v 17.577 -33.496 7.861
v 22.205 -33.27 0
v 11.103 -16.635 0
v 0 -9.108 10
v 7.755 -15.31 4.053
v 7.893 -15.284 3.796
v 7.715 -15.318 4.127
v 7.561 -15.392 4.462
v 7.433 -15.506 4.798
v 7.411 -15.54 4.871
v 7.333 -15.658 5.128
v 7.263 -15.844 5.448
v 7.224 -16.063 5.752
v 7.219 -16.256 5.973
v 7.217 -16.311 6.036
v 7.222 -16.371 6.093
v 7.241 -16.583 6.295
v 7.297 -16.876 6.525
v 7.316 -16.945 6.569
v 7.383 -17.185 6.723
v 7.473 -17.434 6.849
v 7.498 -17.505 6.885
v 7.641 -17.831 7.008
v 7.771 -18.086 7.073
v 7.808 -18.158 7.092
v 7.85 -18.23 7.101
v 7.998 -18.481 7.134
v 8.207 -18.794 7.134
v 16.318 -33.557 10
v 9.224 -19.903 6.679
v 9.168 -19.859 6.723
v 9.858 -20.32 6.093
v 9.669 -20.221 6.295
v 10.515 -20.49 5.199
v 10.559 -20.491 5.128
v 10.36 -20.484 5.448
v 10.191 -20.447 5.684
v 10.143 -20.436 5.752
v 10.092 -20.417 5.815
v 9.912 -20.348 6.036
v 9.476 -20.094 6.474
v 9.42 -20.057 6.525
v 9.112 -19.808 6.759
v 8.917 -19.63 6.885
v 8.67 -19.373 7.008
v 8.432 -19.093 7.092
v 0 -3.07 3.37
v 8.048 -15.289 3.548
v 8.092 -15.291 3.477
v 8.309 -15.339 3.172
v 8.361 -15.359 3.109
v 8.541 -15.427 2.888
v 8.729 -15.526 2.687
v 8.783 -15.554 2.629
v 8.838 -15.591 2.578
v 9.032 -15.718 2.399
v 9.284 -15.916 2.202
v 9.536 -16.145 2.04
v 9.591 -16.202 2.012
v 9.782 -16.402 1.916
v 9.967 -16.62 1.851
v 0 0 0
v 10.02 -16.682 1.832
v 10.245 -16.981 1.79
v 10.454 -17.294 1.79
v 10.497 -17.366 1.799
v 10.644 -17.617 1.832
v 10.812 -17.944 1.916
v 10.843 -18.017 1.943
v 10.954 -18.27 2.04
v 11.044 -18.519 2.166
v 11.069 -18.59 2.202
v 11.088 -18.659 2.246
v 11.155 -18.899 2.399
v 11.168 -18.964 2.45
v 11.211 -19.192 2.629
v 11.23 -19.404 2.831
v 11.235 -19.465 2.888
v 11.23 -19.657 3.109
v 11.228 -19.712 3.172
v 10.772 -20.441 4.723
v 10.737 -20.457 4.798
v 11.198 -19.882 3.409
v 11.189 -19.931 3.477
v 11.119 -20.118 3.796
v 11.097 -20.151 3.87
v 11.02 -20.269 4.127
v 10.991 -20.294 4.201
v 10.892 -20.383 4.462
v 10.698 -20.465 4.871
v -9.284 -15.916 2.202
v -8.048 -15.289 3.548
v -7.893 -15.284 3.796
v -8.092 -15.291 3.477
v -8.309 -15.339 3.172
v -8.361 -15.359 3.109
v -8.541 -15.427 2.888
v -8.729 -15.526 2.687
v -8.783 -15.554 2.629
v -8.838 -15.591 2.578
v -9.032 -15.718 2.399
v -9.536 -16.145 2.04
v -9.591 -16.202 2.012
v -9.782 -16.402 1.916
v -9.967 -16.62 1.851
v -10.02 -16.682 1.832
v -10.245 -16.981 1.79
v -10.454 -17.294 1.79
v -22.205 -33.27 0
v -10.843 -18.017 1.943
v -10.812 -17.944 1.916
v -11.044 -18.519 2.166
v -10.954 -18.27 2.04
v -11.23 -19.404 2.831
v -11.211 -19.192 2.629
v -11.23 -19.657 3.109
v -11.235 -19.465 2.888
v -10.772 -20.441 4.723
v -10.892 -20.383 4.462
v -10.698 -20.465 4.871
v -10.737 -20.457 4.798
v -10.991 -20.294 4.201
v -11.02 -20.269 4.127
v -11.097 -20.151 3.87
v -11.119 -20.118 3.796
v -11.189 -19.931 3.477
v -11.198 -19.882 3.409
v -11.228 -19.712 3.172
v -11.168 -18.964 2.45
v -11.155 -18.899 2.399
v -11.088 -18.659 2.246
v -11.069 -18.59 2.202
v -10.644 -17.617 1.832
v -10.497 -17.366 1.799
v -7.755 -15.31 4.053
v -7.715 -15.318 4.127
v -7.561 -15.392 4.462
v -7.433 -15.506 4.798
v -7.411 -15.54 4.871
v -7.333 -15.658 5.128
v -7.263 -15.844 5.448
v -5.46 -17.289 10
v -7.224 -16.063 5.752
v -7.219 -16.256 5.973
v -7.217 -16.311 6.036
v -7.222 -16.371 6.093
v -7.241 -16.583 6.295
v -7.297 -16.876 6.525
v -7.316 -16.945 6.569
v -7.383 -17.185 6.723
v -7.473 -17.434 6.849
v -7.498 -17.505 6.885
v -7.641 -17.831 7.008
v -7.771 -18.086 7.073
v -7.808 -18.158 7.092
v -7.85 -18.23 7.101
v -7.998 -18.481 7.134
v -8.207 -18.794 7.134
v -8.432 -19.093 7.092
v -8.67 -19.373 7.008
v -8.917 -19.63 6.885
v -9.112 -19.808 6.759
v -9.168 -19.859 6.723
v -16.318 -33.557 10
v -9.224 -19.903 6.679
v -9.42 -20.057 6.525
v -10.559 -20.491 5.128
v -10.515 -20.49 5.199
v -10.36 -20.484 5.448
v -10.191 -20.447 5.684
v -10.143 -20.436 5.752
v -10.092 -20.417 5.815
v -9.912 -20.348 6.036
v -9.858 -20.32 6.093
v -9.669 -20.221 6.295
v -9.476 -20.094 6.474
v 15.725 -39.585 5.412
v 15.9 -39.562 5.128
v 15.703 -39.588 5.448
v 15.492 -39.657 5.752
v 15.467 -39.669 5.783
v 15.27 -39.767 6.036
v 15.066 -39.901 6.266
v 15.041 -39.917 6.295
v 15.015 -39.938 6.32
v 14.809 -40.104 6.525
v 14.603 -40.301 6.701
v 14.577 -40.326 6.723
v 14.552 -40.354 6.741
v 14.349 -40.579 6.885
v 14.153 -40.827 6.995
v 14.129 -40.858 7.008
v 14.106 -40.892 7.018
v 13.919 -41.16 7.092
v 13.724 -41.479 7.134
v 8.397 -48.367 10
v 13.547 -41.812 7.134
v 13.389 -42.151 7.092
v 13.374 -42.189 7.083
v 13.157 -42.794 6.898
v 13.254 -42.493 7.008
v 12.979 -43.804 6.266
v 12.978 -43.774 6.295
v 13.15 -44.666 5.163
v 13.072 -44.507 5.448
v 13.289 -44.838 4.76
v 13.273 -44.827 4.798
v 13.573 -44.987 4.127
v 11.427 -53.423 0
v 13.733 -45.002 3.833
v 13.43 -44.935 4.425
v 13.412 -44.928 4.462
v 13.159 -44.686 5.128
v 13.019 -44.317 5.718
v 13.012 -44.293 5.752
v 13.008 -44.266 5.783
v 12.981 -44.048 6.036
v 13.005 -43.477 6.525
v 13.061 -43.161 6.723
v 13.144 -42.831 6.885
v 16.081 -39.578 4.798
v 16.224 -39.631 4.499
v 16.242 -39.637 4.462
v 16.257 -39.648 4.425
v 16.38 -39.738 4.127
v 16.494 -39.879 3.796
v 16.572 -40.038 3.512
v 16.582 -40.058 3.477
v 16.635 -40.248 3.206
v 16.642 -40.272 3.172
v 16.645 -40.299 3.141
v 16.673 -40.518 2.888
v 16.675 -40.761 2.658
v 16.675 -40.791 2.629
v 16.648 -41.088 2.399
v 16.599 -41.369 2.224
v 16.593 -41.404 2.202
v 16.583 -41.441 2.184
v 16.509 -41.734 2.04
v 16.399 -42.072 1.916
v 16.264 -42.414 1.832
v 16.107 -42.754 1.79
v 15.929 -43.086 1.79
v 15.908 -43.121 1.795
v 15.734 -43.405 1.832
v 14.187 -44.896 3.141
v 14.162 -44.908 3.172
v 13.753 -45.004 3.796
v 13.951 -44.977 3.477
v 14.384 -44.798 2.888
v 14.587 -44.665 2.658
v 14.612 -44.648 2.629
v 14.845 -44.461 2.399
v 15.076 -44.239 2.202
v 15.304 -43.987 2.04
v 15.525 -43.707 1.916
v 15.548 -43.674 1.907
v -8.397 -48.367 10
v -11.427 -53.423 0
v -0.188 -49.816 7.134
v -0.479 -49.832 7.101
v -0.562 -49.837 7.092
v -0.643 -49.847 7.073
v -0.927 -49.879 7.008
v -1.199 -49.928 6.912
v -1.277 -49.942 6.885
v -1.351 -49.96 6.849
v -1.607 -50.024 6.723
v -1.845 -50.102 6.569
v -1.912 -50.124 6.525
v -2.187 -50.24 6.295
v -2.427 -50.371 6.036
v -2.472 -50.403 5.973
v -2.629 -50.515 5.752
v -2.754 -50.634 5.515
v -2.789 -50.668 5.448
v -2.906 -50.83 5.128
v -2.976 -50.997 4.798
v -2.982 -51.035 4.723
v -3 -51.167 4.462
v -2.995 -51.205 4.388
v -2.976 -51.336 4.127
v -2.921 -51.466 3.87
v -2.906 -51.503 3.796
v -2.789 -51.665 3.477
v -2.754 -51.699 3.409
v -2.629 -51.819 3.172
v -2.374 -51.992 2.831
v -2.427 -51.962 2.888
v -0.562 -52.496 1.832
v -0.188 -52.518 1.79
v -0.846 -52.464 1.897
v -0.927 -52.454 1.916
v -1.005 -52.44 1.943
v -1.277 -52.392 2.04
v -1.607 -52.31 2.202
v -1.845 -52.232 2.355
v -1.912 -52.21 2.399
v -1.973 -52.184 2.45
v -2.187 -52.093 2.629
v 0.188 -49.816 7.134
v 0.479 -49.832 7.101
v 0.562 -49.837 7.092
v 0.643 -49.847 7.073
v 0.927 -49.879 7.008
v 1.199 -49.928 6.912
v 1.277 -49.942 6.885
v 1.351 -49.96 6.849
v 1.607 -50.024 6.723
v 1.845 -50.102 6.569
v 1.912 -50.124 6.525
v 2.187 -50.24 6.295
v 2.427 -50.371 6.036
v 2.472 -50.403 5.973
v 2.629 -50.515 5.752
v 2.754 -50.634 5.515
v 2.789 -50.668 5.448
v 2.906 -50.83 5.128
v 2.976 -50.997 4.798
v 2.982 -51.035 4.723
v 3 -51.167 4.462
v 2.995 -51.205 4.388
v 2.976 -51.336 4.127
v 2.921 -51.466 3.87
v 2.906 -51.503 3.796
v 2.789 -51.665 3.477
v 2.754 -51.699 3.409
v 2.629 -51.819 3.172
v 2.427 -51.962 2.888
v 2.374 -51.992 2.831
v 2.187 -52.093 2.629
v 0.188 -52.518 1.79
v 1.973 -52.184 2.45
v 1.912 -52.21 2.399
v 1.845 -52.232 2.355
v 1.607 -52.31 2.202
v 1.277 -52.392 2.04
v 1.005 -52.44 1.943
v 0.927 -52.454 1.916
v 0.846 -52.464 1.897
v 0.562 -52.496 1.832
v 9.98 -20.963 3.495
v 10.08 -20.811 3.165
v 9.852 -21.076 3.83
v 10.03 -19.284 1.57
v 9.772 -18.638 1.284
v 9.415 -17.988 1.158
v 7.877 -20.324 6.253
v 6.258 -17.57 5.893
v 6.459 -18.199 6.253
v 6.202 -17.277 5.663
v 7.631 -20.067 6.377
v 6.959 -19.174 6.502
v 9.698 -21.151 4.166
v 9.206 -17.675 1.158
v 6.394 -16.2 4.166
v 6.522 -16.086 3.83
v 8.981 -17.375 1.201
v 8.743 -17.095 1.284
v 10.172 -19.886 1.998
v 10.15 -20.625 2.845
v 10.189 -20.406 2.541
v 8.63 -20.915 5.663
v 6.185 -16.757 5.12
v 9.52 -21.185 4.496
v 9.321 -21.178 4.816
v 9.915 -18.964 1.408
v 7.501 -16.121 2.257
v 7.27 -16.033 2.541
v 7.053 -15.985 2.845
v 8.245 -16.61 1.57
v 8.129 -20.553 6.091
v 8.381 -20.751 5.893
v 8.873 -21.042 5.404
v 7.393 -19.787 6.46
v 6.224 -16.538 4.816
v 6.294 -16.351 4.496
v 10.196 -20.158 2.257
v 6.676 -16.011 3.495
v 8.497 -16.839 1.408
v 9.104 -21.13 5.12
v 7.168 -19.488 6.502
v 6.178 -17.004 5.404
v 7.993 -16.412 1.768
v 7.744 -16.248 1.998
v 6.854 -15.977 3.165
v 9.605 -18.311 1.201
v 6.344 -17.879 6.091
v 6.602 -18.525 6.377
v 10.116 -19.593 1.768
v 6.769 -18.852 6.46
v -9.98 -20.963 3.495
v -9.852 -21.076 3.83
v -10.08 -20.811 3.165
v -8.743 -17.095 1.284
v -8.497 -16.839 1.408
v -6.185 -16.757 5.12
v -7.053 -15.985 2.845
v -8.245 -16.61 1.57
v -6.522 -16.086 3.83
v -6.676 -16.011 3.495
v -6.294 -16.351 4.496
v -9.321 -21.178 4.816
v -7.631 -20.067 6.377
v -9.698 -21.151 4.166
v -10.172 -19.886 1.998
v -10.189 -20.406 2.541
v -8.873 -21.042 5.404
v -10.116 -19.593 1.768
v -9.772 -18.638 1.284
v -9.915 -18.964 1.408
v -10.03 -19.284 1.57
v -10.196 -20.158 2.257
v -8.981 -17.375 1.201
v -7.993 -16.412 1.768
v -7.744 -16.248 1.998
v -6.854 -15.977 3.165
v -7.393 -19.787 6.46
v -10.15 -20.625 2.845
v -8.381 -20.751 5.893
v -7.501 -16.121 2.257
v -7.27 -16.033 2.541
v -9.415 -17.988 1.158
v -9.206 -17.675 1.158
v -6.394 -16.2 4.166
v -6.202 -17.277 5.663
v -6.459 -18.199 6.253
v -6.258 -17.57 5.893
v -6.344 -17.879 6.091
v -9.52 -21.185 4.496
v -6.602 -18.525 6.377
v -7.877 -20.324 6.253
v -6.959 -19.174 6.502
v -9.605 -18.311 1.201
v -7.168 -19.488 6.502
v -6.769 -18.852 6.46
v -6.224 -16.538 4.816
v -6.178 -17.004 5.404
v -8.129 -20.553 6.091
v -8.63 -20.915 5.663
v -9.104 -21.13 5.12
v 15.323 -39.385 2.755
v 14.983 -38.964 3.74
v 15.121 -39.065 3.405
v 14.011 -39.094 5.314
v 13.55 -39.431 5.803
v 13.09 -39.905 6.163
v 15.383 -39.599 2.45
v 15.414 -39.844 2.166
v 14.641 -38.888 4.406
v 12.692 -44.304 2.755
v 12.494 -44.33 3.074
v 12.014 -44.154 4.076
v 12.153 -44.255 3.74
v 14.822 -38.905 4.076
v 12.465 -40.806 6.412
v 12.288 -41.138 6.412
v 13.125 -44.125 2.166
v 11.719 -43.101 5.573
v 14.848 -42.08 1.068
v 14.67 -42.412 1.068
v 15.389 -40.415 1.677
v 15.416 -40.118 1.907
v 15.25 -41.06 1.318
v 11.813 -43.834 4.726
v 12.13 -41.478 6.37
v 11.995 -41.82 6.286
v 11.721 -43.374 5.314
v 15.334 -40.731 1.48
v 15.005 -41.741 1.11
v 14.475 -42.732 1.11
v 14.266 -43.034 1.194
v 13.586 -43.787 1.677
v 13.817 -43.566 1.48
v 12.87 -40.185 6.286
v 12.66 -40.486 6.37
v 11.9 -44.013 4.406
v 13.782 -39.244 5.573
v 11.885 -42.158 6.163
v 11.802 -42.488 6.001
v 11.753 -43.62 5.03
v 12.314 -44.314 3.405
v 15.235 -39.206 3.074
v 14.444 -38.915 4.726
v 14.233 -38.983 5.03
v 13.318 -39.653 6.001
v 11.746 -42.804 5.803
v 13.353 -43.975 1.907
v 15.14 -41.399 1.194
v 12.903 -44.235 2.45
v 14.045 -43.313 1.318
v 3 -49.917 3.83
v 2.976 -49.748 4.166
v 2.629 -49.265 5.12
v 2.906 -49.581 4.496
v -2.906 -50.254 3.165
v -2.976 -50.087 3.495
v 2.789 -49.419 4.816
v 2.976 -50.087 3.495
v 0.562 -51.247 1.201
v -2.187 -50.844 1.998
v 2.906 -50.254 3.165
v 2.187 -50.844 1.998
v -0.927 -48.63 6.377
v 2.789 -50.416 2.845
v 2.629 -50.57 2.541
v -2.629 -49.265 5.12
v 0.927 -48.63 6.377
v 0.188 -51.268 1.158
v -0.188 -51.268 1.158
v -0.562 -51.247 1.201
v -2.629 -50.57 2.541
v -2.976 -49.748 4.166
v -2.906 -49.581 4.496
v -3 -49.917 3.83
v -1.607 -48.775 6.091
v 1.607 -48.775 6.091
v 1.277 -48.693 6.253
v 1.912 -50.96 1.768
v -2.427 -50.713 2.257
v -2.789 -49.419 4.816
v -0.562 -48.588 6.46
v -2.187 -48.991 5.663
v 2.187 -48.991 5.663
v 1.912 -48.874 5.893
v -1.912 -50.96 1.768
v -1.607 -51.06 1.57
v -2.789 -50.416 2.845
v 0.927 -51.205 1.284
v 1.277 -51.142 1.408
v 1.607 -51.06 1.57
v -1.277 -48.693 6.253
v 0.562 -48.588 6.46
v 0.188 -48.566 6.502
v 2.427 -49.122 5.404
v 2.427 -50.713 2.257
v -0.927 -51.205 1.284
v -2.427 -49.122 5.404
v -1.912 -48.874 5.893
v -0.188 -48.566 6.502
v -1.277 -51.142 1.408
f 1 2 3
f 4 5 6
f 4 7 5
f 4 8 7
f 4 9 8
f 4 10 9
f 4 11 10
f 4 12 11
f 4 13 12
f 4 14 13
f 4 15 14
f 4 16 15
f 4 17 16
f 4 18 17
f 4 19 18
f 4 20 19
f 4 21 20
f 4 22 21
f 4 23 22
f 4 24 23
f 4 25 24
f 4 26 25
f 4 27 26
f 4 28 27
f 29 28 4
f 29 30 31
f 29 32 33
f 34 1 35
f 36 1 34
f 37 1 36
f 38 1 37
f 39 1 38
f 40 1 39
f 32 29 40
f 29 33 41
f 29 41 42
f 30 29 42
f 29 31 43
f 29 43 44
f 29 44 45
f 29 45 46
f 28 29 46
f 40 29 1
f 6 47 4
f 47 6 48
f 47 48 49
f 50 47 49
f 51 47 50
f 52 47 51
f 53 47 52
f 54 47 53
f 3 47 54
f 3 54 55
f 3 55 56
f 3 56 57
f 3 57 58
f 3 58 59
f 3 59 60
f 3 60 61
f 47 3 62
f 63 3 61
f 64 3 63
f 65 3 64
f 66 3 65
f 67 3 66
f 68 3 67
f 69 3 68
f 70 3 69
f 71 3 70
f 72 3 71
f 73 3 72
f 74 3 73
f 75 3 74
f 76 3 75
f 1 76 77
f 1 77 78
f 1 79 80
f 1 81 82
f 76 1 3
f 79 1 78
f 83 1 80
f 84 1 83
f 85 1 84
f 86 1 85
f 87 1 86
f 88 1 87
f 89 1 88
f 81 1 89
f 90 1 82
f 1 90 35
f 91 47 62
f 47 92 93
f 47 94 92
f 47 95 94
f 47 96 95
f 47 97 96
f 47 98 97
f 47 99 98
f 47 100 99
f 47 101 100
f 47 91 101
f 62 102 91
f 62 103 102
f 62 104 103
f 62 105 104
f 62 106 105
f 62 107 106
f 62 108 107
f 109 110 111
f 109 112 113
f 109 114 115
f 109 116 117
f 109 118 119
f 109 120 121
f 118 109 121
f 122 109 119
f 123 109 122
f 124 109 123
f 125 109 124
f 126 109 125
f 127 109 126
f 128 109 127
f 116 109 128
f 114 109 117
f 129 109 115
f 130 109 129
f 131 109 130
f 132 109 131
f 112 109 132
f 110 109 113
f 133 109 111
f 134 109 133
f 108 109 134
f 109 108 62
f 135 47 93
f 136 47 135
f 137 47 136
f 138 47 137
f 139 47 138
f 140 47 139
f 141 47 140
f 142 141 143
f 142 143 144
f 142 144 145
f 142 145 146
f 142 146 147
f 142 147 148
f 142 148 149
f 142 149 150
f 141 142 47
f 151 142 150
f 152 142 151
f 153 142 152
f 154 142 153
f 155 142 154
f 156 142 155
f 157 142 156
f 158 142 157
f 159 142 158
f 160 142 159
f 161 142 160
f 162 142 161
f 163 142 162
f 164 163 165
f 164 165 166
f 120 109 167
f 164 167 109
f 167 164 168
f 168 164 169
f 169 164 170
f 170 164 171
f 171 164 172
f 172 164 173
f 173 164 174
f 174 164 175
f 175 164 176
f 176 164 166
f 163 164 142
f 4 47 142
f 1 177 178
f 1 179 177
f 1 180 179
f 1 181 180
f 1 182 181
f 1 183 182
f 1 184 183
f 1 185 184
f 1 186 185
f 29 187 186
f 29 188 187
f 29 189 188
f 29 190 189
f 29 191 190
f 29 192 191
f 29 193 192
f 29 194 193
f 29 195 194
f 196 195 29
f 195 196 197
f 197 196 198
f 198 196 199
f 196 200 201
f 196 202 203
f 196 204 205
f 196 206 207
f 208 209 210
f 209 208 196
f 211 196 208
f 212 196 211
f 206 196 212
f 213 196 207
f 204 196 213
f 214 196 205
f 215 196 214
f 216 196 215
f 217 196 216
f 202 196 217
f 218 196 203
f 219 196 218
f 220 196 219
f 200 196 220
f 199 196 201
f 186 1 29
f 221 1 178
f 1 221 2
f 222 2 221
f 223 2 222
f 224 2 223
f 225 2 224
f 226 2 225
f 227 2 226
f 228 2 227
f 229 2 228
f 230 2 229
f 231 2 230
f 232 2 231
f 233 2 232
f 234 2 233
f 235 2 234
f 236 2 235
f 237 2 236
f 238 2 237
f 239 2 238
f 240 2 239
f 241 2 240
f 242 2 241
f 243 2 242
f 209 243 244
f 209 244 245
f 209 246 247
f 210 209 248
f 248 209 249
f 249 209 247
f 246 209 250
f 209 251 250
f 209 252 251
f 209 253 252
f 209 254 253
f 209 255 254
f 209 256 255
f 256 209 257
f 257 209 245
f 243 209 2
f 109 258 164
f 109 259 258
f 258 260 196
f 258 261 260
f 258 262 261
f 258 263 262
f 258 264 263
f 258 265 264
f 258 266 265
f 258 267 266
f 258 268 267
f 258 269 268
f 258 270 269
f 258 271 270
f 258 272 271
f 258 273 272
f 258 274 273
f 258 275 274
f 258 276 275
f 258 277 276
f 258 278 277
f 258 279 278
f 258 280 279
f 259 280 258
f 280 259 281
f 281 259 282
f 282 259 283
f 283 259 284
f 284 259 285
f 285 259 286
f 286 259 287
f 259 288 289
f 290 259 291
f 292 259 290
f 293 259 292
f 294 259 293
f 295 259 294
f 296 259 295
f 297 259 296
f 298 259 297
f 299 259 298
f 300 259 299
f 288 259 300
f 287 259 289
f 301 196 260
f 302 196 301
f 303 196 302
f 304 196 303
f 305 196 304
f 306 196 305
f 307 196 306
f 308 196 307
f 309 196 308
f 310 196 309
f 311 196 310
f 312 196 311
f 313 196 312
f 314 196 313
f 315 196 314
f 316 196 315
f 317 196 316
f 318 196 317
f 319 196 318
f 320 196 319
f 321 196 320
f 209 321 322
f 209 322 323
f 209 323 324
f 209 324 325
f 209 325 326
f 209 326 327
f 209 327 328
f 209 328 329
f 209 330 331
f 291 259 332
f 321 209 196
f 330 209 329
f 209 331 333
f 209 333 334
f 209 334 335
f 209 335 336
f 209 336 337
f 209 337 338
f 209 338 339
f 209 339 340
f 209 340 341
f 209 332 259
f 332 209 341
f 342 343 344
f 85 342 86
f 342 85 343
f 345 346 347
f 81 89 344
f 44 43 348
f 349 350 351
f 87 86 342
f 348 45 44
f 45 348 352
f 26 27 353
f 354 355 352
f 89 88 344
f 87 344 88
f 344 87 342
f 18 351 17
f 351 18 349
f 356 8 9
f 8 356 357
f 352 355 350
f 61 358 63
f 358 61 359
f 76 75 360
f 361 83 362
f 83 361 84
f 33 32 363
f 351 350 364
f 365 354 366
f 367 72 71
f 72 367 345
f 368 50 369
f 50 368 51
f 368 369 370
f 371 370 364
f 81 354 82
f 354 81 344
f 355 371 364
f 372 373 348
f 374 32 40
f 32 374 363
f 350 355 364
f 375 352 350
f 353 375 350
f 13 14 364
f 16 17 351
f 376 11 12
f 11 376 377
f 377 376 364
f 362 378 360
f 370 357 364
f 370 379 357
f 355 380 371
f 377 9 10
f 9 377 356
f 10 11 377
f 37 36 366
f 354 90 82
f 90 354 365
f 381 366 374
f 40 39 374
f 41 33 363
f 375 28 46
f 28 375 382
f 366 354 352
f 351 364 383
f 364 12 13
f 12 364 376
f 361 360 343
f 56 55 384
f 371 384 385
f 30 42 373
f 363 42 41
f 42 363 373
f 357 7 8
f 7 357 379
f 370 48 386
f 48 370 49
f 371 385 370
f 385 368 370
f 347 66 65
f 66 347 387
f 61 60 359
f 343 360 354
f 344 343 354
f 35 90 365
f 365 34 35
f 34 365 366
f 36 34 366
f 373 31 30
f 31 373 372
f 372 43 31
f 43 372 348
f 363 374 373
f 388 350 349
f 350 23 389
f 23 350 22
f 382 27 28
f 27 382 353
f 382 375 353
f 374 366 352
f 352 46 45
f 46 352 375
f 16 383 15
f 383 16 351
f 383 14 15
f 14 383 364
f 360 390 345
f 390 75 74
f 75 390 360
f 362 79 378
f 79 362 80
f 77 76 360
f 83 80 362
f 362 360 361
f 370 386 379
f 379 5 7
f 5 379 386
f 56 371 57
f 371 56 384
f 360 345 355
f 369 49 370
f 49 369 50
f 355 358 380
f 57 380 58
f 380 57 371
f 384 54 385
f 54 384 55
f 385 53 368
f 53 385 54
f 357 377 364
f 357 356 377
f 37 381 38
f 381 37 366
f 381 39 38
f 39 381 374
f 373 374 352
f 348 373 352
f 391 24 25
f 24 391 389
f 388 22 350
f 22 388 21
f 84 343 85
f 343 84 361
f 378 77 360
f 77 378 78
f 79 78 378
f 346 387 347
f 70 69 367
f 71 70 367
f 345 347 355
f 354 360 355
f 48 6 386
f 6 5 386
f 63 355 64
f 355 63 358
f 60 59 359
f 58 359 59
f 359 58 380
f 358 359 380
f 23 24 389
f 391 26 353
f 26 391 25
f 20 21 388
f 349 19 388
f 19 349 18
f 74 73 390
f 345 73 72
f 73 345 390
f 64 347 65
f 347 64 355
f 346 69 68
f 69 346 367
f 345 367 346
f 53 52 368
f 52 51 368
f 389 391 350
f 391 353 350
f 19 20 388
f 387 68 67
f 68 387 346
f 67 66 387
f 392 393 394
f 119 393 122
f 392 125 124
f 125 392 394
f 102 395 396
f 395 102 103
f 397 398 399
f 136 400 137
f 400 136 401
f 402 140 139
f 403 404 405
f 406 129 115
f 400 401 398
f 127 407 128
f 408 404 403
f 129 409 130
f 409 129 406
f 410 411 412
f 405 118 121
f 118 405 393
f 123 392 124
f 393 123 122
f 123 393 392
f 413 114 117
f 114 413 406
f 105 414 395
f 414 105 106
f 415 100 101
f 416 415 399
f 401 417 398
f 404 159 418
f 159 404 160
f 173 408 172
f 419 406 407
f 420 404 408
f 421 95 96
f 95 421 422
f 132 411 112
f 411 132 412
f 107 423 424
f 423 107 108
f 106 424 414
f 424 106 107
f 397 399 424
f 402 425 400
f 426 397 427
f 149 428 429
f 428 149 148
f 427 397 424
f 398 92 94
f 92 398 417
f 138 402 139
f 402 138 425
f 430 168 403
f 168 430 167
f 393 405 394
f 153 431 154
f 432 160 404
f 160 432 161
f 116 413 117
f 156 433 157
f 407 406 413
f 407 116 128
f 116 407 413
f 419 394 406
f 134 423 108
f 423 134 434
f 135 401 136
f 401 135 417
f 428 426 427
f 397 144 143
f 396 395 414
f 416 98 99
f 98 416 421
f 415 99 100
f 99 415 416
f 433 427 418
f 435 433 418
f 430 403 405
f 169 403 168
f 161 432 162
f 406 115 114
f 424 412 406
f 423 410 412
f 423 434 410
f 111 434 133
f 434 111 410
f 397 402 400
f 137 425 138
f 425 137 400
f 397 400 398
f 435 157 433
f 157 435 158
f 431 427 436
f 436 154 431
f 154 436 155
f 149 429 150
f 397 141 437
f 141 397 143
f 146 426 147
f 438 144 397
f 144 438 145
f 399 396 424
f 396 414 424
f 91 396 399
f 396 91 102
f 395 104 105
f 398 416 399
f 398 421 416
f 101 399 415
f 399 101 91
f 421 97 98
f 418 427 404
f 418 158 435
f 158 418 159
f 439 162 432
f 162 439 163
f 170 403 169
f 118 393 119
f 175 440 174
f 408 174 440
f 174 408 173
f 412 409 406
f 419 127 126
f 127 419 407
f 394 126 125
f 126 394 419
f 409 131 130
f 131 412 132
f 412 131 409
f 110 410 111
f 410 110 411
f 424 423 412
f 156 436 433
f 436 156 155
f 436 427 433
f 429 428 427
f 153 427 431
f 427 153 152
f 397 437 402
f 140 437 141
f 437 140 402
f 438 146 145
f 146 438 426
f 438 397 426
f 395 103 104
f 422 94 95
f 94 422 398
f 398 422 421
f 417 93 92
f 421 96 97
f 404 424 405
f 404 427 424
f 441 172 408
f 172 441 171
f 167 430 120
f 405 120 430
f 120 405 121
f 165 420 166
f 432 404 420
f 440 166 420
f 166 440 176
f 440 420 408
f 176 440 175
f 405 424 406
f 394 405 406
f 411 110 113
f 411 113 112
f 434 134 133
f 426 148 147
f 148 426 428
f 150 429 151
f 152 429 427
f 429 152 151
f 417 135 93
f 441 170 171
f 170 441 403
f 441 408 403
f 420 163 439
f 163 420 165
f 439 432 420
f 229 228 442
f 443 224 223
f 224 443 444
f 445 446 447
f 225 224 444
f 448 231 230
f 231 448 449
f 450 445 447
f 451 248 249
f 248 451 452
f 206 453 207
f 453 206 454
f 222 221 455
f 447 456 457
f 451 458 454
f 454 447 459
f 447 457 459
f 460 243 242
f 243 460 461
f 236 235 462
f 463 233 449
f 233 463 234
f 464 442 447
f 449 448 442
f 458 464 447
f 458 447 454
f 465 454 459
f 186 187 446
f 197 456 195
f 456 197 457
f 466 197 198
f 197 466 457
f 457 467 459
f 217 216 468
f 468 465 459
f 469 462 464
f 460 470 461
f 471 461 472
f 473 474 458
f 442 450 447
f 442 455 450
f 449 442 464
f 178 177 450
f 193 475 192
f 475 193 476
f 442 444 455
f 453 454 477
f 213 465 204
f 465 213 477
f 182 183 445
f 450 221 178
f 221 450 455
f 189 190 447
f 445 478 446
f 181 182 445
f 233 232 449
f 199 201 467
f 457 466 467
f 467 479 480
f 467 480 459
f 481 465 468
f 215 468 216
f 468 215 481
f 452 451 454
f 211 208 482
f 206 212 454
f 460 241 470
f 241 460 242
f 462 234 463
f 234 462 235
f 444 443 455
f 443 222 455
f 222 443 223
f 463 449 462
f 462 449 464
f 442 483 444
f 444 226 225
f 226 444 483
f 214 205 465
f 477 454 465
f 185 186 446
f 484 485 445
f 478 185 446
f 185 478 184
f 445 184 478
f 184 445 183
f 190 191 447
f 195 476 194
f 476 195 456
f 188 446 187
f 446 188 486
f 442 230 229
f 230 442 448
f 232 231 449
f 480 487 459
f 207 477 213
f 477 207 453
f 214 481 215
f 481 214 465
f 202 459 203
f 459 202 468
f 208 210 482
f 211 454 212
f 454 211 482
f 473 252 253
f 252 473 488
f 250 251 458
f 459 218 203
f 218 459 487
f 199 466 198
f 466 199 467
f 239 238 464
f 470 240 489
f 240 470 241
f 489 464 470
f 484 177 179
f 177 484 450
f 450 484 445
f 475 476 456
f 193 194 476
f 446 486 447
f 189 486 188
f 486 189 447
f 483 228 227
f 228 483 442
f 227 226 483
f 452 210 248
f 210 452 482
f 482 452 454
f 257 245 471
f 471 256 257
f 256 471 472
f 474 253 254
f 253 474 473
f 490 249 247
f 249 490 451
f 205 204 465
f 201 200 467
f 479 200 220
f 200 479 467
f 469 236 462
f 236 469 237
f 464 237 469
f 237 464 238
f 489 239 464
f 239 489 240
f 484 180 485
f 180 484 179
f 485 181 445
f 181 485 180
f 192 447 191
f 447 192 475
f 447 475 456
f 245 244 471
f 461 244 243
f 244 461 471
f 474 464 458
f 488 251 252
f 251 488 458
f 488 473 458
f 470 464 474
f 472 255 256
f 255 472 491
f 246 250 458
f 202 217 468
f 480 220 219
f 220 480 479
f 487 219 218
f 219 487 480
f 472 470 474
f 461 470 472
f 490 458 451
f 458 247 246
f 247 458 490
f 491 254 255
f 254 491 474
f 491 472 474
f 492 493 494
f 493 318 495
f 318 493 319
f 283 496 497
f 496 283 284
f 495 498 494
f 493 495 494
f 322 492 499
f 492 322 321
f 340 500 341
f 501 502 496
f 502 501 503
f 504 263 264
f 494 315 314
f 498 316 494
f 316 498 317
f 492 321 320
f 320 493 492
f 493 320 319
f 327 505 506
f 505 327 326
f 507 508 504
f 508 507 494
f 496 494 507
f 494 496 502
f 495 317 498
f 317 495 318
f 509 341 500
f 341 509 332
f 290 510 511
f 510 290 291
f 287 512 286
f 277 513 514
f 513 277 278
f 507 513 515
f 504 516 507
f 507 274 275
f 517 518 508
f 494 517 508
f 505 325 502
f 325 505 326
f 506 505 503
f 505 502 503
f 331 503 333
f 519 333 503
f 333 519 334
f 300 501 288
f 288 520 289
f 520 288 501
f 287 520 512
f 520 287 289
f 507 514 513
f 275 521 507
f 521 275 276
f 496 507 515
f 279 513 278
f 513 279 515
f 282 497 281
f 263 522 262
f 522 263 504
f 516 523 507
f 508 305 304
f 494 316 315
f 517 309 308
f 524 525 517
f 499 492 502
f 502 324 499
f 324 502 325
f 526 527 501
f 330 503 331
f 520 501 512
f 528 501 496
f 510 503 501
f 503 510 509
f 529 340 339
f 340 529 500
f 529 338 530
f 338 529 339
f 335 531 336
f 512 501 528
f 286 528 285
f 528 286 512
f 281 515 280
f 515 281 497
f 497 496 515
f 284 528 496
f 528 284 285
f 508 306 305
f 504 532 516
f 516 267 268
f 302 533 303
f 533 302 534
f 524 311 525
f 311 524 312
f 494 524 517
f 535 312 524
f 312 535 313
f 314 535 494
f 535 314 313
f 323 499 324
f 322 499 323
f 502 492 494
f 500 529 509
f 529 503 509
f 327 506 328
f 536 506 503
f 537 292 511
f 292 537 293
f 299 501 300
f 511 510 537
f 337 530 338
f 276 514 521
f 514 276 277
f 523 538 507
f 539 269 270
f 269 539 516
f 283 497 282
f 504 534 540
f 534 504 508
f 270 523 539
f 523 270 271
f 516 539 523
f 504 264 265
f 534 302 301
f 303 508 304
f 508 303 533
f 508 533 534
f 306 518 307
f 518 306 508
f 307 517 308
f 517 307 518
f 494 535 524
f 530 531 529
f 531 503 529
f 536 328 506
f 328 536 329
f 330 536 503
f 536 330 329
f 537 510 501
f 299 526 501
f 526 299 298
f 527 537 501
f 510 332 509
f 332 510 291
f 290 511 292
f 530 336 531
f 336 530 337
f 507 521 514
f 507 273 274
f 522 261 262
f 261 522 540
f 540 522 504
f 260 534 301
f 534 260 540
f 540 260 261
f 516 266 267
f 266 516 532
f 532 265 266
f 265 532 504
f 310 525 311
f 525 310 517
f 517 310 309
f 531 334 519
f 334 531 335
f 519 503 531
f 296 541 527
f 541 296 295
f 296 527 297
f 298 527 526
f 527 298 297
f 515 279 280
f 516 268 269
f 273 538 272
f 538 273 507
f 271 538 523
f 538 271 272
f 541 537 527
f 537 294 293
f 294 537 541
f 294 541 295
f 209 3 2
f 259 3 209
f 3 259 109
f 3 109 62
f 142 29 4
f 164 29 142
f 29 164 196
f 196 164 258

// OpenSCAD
//Pentagonal hexecontahedron with magnets
//All "left" long sides must have the same magnet polarity
//All "right long sides must have the same magnet polarity opposite all "left" long sides
//All flat "bottoms" must have the same magnet polarity
//All short sides to the left of the flat bottoms (looking into the cupped floret) must have the opposite polarity of the bottoms
//The right short sides CAN'T have magnets!!! They all have to connect togther.

//Dihedral angle: 153.1786°
//big angle x4, 118.14°, smallangle x1 67.44°
$fn=50;

//to do put in my diagram

longside = 40; //long side -- this is the only parameter needed to define our pentagon
thickness = 10; //how thick our piece is

magnetdepth = 1.6;
magnetdiam = 6;

dihedral = 153.1786; //the dihedral angle of our thing is fixed
alpha = 67.44; //the small angle of the point
beta = 118.14; //the larger angle between the other points


b = sin(alpha/2)*longside;
a = cos(alpha/2)*longside;

gamma = asin(a/longside);

shortside = 2*b/(1+2*cos(beta-gamma));

c = sin(beta-gamma)*shortside;

d = thickness/tan(dihedral/2);

e = sin(180-beta)*thickness;
f = sqrt(thickness*thickness-e*e);

module mainbody(){
linear_extrude(height = thickness ) {
polygon([[0,0],[+b,-a],[shortside/2,-a-c],[-shortside/2,-a-c],[-b,-a]]);
}}

module chamfers() {
rotate([180-dihedral,0,-90+alpha/2]){
linear_extrude(center=true, height=25) {
polygon([[-5,0],[-5,thickness],[longside+5,thickness],[longside+5,0]]);
}}

rotate([180-dihedral,0,90-alpha/2]){
mirror([1,0,0]){
linear_extrude(center=false, height=25) {
polygon([[-5,0],[-5,thickness],[longside+5,thickness],[longside+5,0]]);}
}}

translate([(shortside/2),-a-c,0]){
rotate([-180+dihedral,0,180-beta]){
translate([0,-thickness,0]){
linear_extrude(center=true, height=25) {
polygon([[-5,0],[-5,thickness],[shortside,thickness],[shortside,0]]);
}}}}

mirror([1,0,0]){
translate([(shortside/2),-a-c,0]){
rotate([-180+dihedral,0,180-beta]){
translate([0,-thickness,0]){
linear_extrude(center=true, height=25) {
polygon([[-5,0],[-5,thickness],[shortside,thickness],[shortside,0]]);
}}}}}


translate([0,-a-c,0]){
rotate([-180+dihedral,0,0]){
linear_extrude(center=true, height=25) {
polygon([[-shortside/2,-thickness],[shortside/2,-thickness],[shortside/2,0],[-shortside/2,0]]);
}}}

}

module magnets() {

//MAGNETS
rotate([90-dihedral,0,-90+alpha/2]){
translate([longside/2,-thickness/2,-magnetdepth+0.2]){
linear_extrude(center=false, height=magnetdepth+0.2) {
circle(magnetdiam/2);
}}}



mirror([1,0,0]){
rotate([90-dihedral,0,-90+alpha/2]){
translate([longside/2,-thickness/2,-magnetdepth+0.2]){
linear_extrude(center=false, height=magnetdepth+0.2) {
circle(magnetdiam/2);
}}}}


translate([(shortside/2),-a-c,0]){
rotate([-180+dihedral,0,180-beta]){
rotate([-90,0,0]){//90-dihedral
translate([shortside/2,-thickness/2,-.2]){
linear_extrude(center=false, height=magnetdepth+0.2) {
circle(magnetdiam/2);
}}}
}}

/*mirror([1,0,0]){
translate([(shortside/2),-a-c,0]){
rotate([-180+dihedral,0,180-beta]){
rotate([-90,0,0]){//90-dihedral
translate([shortside/2,-thickness/2,-.2]){
linear_extrude(center=false, height=magnetdepth+0.2) {
circle(magnetdiam/2);
}}}
}}}*/

translate([0,-a-c,0]){
rotate([-180+dihedral,0,0]){
translate([0,magnetdepth-.2,thickness/2]){
rotate([90,0,0]){
linear_extrude(center=false, height=magnetdepth+0.2) {
circle(magnetdiam/2);
}}}
}}

}


difference(){
	mainbody();
		union(){
		chamfers();
		magnets();}
}
